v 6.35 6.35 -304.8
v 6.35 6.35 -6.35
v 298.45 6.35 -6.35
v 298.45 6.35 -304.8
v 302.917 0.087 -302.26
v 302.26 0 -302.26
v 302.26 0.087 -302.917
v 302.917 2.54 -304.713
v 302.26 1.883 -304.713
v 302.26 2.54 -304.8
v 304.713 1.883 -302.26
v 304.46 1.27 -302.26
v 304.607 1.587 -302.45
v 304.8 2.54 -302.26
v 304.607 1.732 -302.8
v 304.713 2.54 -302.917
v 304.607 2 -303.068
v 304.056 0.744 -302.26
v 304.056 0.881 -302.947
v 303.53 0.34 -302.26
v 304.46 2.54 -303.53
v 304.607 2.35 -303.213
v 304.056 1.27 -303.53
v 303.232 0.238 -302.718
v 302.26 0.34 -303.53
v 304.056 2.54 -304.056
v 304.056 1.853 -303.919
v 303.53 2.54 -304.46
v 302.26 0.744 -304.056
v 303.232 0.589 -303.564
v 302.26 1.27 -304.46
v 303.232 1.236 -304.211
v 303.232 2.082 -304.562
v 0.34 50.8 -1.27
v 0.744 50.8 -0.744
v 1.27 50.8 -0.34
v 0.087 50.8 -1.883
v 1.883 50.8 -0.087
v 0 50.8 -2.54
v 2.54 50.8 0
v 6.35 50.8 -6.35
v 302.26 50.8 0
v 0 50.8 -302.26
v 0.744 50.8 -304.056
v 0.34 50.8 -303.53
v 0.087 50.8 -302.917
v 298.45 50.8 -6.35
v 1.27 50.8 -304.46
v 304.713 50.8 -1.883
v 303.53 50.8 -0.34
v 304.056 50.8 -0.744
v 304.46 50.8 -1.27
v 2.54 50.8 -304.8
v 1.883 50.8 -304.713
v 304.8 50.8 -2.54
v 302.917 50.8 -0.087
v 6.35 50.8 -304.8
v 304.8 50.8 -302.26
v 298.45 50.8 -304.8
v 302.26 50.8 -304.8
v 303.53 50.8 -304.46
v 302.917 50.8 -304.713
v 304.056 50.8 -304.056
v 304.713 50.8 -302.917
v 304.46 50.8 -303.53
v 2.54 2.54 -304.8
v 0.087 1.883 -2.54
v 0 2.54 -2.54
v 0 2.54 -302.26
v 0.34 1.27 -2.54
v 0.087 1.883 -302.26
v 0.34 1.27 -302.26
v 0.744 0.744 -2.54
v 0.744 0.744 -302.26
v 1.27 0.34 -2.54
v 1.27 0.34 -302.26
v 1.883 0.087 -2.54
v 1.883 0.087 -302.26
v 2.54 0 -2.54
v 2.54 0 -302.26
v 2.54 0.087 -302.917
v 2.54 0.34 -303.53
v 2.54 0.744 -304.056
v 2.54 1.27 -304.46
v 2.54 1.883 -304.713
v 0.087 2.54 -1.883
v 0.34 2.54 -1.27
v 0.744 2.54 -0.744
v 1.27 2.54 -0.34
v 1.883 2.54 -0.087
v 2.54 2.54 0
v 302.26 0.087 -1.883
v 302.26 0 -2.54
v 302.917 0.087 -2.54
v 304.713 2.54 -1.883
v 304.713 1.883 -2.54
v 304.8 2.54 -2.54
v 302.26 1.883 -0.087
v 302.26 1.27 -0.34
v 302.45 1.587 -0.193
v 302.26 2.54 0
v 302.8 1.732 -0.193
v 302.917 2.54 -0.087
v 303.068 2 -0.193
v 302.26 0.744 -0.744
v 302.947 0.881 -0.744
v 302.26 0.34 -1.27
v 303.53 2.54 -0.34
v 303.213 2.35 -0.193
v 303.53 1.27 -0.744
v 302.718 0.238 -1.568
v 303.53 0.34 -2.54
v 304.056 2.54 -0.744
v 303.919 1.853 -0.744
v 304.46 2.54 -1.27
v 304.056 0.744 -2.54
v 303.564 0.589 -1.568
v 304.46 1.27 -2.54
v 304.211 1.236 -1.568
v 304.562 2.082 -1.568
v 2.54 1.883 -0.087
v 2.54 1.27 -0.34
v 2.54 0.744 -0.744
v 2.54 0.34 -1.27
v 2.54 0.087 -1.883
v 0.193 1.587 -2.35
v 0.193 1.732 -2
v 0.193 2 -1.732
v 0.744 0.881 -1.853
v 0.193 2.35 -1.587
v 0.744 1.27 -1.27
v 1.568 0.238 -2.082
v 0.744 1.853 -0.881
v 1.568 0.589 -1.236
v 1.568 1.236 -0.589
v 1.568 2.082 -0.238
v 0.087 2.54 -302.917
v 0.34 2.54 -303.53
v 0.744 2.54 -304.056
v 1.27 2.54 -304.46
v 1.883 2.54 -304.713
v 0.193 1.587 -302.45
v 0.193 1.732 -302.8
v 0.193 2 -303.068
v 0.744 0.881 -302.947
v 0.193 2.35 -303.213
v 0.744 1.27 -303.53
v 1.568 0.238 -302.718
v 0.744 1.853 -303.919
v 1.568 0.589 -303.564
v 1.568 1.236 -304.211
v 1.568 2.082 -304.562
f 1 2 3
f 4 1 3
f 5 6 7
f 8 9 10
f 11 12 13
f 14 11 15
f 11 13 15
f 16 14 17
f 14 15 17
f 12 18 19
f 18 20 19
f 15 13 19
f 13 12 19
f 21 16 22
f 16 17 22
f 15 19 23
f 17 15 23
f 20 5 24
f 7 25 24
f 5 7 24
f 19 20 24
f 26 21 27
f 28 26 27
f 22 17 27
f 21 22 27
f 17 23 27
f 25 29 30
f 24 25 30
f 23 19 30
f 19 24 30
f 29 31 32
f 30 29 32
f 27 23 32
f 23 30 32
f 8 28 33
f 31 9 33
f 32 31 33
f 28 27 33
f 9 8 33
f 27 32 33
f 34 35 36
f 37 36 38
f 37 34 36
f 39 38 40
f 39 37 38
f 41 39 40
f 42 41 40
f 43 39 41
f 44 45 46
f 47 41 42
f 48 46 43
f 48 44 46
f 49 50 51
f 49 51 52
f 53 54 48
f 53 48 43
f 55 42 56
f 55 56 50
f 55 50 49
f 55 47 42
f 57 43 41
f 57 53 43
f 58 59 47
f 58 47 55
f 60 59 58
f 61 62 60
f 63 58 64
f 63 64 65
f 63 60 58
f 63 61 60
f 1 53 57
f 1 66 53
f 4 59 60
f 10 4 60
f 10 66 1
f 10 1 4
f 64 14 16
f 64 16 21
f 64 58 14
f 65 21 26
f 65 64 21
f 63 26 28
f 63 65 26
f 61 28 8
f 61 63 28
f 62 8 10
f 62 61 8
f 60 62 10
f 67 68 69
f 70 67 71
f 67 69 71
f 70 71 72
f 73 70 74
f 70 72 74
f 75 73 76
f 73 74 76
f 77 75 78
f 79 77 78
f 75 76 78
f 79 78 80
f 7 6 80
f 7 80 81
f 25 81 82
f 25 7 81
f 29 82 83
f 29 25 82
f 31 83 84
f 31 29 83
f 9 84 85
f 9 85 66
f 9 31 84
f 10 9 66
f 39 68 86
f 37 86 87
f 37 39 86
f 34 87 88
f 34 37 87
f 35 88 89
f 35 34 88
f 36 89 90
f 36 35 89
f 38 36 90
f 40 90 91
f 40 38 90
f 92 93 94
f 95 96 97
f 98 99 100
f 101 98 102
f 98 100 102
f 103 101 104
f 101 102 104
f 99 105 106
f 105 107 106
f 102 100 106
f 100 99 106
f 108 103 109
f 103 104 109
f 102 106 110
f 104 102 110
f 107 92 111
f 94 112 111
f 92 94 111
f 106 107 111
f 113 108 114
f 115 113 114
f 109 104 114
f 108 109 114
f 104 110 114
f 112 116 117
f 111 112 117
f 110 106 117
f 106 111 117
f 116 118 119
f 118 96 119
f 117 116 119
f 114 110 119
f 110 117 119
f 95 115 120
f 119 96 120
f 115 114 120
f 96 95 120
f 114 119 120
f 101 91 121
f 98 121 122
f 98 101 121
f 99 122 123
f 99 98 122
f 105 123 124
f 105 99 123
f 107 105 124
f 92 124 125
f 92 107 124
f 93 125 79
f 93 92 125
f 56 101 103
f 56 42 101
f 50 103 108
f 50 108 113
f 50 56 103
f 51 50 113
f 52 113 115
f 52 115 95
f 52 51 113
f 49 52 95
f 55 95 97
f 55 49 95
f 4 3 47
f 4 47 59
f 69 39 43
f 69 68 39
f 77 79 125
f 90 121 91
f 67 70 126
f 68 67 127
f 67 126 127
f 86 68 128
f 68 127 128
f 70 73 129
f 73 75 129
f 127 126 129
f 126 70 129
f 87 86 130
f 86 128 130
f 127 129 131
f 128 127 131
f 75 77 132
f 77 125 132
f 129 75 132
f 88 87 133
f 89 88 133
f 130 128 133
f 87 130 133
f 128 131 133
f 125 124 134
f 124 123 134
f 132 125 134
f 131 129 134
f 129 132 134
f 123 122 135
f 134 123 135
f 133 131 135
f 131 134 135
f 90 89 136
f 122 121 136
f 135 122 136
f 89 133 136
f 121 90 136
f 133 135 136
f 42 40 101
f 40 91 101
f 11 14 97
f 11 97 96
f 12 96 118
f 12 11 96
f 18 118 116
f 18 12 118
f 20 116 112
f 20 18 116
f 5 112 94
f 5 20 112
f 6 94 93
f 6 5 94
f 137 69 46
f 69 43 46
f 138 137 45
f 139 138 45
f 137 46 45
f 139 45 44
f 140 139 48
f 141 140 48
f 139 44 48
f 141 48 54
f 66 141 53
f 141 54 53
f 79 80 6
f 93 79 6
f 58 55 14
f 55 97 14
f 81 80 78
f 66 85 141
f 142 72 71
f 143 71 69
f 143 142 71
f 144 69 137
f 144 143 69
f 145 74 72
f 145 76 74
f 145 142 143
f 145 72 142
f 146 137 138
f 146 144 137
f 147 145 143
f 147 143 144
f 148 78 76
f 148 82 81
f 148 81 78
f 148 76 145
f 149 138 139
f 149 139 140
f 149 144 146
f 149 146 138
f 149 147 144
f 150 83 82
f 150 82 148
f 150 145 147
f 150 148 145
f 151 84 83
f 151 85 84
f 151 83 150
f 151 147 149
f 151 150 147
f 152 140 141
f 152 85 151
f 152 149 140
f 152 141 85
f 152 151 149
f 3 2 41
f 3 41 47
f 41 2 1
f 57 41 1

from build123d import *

# Parameters (mm, degrees)
SKETCH1_W           = 304.8
SKETCH1_H           = 304.8
BOSS_EXTRUDE1_DEPTH = 50.8
SHELL1_T            = -6.35
FILLET1_R           = 2.54


with BuildPart() as part:
    # Sketch1 → Boss-Extrude1 (new body)
    with BuildSketch(Plane(origin=(0, 0, 0), x_dir=(1, 0, 0), z_dir=(0, 1, 0))):
        with Locations((152.4, 152.4)):
            Rectangle(SKETCH1_W, SKETCH1_H)
    extrude(amount=BOSS_EXTRUDE1_DEPTH)

    # Shell1
    shell1_openings = [part.faces().sort_by_distance(p)[0] for p in [
        (152.4, 50.8, -152.4),
        (152.4, 25.4, -304.8),
    ]]
    offset(amount=SHELL1_T, openings=shell1_openings, kind=Kind.INTERSECTION)

    # Fillet1
    fillet1_edges = [part.edges().sort_by_distance(p)[0] for p in [
        (152.4, 0, -304.8),
        (304.8, 0, -152.4),
        (152.4, 0, 0),
        (0, 0, -152.4),
        (0, 25.4, -304.8),
        (304.8, 25.4, -304.8),
        (304.8, 25.4, 0),
        (0, 25.4, 0),
    ]]
    fillet(fillet1_edges, radius=FILLET1_R)


solid = part.part
